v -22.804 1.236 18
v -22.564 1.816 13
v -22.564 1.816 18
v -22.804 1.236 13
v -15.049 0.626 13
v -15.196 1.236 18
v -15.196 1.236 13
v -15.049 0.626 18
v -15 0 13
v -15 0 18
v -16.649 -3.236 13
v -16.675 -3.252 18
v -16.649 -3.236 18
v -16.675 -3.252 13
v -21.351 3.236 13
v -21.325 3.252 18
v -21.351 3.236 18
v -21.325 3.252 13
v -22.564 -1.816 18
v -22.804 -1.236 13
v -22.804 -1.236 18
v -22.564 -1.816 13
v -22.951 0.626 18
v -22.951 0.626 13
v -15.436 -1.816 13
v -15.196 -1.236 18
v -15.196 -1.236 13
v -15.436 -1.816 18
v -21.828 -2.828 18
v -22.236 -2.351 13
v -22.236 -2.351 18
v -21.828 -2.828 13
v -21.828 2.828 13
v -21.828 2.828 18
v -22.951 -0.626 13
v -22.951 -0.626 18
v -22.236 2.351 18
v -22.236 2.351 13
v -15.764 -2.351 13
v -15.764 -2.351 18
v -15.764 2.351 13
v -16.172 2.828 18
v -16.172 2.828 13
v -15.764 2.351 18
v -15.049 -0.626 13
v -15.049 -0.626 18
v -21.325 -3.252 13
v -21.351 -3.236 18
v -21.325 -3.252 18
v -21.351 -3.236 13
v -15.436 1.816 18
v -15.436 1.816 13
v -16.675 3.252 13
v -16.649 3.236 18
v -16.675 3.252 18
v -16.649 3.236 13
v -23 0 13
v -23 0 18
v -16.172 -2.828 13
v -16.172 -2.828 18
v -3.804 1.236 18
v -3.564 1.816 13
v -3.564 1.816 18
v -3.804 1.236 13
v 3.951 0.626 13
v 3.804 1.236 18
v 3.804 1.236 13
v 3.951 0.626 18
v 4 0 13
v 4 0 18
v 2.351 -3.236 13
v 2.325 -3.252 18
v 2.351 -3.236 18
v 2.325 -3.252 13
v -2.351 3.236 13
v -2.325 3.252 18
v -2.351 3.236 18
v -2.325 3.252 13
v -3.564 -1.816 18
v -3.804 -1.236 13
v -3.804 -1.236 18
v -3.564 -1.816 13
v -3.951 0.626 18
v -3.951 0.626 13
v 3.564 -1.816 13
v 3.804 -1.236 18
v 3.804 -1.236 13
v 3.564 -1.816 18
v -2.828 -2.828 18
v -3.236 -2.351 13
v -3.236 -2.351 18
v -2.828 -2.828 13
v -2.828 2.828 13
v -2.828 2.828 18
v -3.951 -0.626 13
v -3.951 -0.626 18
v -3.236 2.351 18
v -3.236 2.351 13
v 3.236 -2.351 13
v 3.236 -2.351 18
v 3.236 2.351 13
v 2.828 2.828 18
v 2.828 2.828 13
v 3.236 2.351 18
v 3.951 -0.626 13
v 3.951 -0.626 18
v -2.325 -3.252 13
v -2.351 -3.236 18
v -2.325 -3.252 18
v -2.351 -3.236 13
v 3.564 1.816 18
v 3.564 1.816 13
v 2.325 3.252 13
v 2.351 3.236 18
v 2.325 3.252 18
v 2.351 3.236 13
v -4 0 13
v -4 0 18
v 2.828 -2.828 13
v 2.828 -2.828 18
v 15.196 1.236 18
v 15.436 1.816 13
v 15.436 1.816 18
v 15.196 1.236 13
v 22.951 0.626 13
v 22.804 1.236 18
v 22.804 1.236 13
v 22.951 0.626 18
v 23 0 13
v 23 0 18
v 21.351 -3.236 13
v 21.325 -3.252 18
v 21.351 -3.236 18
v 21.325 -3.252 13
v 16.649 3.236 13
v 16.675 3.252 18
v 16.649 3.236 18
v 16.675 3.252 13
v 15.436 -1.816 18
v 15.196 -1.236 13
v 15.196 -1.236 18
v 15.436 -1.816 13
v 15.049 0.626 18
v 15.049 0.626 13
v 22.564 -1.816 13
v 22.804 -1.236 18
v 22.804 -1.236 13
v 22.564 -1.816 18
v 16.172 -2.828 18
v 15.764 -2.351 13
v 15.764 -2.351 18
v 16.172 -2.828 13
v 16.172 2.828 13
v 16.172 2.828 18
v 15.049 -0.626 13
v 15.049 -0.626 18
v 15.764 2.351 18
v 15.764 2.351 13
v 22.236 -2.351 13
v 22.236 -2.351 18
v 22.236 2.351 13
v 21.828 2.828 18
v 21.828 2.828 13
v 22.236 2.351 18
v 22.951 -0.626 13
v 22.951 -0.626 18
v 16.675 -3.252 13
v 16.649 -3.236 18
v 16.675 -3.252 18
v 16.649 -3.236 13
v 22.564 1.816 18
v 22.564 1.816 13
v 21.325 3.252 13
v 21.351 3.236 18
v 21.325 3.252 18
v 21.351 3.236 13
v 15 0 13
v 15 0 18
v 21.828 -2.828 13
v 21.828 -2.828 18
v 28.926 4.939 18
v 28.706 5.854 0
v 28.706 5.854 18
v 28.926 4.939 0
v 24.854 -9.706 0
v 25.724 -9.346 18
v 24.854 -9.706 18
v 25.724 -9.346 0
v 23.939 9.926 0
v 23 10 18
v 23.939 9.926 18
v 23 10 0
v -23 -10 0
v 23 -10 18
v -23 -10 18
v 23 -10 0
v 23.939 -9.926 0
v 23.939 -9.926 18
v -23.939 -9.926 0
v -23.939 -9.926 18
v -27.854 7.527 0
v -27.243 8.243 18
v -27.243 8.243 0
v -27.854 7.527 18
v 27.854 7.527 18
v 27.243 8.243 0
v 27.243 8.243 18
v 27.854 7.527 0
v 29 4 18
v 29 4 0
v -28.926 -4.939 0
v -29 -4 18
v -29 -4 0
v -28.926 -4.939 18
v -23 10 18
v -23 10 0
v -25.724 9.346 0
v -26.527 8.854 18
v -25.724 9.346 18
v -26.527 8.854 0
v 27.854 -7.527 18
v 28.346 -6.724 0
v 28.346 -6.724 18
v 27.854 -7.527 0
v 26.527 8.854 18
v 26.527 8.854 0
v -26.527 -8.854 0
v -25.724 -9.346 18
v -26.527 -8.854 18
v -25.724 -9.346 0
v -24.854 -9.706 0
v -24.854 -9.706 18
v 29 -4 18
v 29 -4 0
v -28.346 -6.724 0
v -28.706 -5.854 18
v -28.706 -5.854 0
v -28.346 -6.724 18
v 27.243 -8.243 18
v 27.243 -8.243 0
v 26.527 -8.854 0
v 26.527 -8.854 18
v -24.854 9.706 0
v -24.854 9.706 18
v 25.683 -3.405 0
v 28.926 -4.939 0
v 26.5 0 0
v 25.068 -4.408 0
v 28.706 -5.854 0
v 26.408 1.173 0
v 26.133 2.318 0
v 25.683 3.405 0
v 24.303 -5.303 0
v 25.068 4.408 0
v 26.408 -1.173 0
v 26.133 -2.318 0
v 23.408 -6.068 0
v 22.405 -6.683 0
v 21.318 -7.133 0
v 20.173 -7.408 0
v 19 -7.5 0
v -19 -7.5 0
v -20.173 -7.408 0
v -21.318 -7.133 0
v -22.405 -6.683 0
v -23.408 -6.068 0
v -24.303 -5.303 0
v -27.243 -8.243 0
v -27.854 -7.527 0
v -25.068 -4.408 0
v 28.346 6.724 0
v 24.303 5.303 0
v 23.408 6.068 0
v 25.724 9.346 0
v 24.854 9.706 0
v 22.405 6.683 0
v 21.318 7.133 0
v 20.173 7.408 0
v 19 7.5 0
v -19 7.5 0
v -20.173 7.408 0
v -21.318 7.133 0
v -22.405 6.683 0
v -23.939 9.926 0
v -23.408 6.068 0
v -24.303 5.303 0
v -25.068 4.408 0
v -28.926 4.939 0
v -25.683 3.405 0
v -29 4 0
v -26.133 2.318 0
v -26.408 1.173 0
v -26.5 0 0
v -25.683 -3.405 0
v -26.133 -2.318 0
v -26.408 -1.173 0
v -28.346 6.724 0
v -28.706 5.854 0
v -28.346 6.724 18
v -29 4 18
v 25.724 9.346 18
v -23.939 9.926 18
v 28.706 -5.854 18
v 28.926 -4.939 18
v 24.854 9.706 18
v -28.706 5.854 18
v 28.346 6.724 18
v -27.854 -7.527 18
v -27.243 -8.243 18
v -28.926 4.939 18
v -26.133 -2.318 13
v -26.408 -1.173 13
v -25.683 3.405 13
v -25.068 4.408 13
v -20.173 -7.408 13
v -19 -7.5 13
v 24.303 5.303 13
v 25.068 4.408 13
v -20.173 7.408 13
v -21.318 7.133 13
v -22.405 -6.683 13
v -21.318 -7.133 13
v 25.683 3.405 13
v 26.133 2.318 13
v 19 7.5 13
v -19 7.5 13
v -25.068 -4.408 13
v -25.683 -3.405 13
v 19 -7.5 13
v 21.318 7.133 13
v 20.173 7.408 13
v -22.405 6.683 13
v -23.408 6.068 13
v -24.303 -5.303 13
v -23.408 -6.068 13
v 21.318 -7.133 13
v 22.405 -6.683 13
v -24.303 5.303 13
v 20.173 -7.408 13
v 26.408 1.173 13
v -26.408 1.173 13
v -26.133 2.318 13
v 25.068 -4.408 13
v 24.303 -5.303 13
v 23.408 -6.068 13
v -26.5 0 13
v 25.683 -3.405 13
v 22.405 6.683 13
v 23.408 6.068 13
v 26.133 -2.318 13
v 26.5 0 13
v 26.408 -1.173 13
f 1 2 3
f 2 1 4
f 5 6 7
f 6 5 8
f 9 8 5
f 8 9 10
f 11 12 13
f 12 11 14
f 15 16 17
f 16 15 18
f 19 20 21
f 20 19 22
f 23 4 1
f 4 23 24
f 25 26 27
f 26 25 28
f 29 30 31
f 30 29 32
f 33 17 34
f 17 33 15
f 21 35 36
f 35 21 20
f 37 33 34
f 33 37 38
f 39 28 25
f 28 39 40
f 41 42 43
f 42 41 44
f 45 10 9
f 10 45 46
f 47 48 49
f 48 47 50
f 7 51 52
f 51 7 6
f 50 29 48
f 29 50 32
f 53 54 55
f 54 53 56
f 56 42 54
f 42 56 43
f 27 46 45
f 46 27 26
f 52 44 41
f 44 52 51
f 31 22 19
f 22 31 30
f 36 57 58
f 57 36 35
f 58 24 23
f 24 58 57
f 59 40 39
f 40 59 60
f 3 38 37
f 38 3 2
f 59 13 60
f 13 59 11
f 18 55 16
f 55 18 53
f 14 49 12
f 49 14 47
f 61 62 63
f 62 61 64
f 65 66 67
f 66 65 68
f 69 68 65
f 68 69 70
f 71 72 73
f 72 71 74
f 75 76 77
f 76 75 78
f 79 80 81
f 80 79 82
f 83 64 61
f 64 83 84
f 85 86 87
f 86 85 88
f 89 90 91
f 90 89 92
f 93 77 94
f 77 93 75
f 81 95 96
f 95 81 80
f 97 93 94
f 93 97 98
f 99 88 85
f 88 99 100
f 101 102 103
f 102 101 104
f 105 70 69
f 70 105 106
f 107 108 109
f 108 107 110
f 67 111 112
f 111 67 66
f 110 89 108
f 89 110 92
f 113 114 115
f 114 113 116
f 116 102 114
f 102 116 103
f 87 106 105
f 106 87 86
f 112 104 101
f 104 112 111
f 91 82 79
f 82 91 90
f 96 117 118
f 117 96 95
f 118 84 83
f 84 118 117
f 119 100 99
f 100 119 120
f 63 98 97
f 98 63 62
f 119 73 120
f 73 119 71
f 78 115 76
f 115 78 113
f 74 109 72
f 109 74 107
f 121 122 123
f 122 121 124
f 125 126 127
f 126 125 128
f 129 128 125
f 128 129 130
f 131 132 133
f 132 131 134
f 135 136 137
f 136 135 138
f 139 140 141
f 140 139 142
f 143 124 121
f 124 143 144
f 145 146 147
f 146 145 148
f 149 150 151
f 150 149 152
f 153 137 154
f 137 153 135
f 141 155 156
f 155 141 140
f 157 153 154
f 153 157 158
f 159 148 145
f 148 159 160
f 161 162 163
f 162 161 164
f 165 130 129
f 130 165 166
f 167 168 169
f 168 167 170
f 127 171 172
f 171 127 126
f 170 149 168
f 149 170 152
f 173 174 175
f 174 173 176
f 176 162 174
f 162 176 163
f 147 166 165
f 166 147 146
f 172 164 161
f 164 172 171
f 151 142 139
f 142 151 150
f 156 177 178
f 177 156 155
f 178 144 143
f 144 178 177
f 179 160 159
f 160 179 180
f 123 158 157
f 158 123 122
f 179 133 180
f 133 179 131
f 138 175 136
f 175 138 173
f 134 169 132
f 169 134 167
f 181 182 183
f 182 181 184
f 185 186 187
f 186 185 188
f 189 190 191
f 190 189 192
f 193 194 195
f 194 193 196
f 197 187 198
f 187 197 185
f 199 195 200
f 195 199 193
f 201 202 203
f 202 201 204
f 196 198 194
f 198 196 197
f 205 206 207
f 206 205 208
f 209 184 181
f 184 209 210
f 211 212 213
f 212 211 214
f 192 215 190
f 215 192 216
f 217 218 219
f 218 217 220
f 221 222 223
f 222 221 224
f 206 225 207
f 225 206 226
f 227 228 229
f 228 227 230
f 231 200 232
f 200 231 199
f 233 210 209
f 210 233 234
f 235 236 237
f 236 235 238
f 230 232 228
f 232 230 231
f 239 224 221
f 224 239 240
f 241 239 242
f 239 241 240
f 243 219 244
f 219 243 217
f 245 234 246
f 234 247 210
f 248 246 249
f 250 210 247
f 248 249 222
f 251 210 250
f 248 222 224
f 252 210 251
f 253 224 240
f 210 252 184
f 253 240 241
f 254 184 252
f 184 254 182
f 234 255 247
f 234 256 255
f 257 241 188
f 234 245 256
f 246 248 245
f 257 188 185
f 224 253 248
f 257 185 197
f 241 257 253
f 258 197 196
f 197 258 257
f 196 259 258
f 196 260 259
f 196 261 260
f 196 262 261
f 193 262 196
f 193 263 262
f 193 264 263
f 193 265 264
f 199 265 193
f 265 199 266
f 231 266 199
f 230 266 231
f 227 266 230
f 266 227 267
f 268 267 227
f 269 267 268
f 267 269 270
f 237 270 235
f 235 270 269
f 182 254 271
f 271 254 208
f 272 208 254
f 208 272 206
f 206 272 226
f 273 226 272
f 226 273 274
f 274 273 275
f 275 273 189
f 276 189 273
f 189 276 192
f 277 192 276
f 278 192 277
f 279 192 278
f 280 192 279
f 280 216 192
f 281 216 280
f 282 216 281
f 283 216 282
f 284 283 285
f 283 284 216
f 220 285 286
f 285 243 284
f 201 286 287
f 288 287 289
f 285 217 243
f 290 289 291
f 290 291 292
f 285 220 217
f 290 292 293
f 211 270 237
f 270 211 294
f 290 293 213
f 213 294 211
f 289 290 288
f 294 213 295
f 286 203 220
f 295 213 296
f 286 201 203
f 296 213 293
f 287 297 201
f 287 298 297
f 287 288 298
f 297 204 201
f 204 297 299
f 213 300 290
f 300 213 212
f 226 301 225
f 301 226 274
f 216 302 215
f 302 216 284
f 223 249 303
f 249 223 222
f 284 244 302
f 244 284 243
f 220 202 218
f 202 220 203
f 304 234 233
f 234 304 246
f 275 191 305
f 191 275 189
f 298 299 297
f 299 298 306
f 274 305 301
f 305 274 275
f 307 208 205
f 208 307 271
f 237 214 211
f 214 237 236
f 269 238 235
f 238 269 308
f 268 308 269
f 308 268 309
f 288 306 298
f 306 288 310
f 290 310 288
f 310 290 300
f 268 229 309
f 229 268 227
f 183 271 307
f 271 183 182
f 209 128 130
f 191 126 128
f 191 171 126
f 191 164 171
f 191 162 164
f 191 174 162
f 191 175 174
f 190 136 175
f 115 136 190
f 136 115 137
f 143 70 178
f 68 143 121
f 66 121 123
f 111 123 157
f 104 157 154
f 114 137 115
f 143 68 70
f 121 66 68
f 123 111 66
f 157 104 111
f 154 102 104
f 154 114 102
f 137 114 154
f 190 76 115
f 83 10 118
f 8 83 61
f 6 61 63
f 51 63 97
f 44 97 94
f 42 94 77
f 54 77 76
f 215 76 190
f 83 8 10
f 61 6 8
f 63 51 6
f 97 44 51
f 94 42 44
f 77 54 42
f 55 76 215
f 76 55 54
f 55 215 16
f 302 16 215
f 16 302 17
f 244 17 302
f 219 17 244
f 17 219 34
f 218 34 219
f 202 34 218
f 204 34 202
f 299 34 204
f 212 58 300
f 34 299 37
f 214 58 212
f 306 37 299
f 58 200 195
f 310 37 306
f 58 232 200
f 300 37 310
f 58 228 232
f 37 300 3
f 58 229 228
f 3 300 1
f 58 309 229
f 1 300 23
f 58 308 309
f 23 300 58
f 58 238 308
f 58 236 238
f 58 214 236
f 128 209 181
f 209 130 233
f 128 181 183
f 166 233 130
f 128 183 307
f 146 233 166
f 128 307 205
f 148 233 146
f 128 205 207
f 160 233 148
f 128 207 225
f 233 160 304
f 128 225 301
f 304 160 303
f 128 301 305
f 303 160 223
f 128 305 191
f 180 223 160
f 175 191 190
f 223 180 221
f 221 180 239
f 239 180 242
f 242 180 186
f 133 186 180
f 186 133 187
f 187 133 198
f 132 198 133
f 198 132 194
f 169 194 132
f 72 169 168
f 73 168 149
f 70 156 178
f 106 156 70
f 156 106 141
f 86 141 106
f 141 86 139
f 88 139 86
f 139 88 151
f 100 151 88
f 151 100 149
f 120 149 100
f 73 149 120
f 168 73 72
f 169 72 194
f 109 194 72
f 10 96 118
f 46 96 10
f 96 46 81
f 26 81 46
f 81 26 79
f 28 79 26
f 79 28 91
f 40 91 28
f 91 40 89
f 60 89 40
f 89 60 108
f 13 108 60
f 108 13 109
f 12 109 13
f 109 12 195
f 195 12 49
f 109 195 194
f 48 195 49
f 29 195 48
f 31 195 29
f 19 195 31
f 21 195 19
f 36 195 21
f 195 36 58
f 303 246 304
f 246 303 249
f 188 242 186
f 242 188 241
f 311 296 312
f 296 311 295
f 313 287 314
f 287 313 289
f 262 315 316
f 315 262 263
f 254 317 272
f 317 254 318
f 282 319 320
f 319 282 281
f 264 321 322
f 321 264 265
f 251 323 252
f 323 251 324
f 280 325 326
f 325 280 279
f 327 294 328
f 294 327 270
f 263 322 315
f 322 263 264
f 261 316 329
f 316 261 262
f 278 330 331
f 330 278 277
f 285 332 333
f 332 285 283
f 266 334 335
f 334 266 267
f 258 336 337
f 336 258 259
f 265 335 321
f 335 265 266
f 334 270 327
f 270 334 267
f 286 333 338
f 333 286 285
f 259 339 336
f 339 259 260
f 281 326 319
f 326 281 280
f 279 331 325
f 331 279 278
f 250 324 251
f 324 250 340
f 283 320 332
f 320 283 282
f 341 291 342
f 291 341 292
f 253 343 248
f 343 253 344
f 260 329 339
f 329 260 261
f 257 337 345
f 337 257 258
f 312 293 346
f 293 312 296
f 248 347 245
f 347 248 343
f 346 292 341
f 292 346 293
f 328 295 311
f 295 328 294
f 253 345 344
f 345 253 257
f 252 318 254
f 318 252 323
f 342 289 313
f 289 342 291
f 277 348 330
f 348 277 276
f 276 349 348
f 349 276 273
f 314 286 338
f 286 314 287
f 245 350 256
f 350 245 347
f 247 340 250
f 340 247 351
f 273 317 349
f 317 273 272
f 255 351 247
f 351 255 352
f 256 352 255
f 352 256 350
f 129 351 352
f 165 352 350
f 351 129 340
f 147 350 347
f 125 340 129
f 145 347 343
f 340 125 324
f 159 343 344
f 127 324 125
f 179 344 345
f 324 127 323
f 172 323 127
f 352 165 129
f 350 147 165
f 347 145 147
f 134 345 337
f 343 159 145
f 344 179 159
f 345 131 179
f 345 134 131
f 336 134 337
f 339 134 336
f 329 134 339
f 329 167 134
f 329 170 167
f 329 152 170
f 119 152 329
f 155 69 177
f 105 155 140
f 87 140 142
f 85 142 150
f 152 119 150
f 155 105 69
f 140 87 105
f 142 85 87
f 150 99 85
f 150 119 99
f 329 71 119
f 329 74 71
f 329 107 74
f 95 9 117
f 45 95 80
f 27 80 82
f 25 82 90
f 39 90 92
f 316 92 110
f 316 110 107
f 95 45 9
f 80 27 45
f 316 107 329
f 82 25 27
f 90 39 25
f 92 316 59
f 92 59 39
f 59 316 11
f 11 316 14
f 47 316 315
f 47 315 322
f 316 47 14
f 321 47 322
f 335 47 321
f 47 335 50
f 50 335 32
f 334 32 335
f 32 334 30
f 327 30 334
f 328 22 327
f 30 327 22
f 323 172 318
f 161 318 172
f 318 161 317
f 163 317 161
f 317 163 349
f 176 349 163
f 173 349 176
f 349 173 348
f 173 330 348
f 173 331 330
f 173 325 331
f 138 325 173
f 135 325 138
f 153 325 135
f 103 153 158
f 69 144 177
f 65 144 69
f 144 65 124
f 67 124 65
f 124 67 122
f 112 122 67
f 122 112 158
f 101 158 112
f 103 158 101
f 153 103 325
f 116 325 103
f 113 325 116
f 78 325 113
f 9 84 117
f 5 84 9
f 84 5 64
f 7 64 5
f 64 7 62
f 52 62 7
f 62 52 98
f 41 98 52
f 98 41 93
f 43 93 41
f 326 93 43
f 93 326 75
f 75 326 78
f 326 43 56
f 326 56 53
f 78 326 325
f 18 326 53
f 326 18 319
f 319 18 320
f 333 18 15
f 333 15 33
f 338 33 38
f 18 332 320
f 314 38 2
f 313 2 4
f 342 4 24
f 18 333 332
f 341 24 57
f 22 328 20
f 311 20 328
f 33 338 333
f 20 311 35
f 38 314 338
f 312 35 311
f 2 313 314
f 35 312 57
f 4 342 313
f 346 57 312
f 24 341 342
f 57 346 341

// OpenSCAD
//openscad customizer
// Pole distance 
Distance = 38; // [20:100]
// Roundness
Roundness = 6; // [0:8]
// PE
PE_HOLE = "yes"; // [yes,no]
// Hole
Hole = 8; // [6:10]
// Height
Hoehe = 18; // [6:30]

Dicke = Hole * 5 / 8;
Breite   = Hole+12;
ROF = 0.1;




difference(){
  BOX();
  translate([-Distance/2,0,-ROF/2])  BOHRUNG(d = Hole, h = Hoehe+ROF, s = Hole / 1.23);
  if (PE_HOLE == "yes")
  {translate([0,0,-ROF/2])  BOHRUNG(d = Hole, h = Hoehe+ROF, s = Hole / 1.23);}
  translate([Distance/2,0,-ROF/2])  BOHRUNG(d = Hole, h = Hoehe+ROF, s = Hole / 1.23);
  
  hull()
  {
     translate([-Distance/2,0,-ROF/2])  cylinder(Hoehe+ROF/2-Dicke,15/2,15/2, $fn = 40);
     translate([Distance/2,0,-ROF/2])  cylinder(Hoehe+ROF/2-Dicke,15/2,15/2, $fn = 40);
  }  
}

module BOX()
{
  linear_extrude(Hoehe) offset(r = Roundness, $fn = 40) {
      square([Distance+Breite-(2*Roundness),Breite-(2*Roundness)], center = true);
  } 
}  

module BOHRUNG(d=8, h = 20, s=6.5 )
{
  
  difference()
  {
    cylinder(h,d/2,d/2, $fn = 40);
    translate([-d/2,s/2,0]) cube([d,d/2,h]);
    translate([-d/2,-s/2,0]) mirror([0,1,0]) cube([d,d/2,h]);
  }
  
  
}
